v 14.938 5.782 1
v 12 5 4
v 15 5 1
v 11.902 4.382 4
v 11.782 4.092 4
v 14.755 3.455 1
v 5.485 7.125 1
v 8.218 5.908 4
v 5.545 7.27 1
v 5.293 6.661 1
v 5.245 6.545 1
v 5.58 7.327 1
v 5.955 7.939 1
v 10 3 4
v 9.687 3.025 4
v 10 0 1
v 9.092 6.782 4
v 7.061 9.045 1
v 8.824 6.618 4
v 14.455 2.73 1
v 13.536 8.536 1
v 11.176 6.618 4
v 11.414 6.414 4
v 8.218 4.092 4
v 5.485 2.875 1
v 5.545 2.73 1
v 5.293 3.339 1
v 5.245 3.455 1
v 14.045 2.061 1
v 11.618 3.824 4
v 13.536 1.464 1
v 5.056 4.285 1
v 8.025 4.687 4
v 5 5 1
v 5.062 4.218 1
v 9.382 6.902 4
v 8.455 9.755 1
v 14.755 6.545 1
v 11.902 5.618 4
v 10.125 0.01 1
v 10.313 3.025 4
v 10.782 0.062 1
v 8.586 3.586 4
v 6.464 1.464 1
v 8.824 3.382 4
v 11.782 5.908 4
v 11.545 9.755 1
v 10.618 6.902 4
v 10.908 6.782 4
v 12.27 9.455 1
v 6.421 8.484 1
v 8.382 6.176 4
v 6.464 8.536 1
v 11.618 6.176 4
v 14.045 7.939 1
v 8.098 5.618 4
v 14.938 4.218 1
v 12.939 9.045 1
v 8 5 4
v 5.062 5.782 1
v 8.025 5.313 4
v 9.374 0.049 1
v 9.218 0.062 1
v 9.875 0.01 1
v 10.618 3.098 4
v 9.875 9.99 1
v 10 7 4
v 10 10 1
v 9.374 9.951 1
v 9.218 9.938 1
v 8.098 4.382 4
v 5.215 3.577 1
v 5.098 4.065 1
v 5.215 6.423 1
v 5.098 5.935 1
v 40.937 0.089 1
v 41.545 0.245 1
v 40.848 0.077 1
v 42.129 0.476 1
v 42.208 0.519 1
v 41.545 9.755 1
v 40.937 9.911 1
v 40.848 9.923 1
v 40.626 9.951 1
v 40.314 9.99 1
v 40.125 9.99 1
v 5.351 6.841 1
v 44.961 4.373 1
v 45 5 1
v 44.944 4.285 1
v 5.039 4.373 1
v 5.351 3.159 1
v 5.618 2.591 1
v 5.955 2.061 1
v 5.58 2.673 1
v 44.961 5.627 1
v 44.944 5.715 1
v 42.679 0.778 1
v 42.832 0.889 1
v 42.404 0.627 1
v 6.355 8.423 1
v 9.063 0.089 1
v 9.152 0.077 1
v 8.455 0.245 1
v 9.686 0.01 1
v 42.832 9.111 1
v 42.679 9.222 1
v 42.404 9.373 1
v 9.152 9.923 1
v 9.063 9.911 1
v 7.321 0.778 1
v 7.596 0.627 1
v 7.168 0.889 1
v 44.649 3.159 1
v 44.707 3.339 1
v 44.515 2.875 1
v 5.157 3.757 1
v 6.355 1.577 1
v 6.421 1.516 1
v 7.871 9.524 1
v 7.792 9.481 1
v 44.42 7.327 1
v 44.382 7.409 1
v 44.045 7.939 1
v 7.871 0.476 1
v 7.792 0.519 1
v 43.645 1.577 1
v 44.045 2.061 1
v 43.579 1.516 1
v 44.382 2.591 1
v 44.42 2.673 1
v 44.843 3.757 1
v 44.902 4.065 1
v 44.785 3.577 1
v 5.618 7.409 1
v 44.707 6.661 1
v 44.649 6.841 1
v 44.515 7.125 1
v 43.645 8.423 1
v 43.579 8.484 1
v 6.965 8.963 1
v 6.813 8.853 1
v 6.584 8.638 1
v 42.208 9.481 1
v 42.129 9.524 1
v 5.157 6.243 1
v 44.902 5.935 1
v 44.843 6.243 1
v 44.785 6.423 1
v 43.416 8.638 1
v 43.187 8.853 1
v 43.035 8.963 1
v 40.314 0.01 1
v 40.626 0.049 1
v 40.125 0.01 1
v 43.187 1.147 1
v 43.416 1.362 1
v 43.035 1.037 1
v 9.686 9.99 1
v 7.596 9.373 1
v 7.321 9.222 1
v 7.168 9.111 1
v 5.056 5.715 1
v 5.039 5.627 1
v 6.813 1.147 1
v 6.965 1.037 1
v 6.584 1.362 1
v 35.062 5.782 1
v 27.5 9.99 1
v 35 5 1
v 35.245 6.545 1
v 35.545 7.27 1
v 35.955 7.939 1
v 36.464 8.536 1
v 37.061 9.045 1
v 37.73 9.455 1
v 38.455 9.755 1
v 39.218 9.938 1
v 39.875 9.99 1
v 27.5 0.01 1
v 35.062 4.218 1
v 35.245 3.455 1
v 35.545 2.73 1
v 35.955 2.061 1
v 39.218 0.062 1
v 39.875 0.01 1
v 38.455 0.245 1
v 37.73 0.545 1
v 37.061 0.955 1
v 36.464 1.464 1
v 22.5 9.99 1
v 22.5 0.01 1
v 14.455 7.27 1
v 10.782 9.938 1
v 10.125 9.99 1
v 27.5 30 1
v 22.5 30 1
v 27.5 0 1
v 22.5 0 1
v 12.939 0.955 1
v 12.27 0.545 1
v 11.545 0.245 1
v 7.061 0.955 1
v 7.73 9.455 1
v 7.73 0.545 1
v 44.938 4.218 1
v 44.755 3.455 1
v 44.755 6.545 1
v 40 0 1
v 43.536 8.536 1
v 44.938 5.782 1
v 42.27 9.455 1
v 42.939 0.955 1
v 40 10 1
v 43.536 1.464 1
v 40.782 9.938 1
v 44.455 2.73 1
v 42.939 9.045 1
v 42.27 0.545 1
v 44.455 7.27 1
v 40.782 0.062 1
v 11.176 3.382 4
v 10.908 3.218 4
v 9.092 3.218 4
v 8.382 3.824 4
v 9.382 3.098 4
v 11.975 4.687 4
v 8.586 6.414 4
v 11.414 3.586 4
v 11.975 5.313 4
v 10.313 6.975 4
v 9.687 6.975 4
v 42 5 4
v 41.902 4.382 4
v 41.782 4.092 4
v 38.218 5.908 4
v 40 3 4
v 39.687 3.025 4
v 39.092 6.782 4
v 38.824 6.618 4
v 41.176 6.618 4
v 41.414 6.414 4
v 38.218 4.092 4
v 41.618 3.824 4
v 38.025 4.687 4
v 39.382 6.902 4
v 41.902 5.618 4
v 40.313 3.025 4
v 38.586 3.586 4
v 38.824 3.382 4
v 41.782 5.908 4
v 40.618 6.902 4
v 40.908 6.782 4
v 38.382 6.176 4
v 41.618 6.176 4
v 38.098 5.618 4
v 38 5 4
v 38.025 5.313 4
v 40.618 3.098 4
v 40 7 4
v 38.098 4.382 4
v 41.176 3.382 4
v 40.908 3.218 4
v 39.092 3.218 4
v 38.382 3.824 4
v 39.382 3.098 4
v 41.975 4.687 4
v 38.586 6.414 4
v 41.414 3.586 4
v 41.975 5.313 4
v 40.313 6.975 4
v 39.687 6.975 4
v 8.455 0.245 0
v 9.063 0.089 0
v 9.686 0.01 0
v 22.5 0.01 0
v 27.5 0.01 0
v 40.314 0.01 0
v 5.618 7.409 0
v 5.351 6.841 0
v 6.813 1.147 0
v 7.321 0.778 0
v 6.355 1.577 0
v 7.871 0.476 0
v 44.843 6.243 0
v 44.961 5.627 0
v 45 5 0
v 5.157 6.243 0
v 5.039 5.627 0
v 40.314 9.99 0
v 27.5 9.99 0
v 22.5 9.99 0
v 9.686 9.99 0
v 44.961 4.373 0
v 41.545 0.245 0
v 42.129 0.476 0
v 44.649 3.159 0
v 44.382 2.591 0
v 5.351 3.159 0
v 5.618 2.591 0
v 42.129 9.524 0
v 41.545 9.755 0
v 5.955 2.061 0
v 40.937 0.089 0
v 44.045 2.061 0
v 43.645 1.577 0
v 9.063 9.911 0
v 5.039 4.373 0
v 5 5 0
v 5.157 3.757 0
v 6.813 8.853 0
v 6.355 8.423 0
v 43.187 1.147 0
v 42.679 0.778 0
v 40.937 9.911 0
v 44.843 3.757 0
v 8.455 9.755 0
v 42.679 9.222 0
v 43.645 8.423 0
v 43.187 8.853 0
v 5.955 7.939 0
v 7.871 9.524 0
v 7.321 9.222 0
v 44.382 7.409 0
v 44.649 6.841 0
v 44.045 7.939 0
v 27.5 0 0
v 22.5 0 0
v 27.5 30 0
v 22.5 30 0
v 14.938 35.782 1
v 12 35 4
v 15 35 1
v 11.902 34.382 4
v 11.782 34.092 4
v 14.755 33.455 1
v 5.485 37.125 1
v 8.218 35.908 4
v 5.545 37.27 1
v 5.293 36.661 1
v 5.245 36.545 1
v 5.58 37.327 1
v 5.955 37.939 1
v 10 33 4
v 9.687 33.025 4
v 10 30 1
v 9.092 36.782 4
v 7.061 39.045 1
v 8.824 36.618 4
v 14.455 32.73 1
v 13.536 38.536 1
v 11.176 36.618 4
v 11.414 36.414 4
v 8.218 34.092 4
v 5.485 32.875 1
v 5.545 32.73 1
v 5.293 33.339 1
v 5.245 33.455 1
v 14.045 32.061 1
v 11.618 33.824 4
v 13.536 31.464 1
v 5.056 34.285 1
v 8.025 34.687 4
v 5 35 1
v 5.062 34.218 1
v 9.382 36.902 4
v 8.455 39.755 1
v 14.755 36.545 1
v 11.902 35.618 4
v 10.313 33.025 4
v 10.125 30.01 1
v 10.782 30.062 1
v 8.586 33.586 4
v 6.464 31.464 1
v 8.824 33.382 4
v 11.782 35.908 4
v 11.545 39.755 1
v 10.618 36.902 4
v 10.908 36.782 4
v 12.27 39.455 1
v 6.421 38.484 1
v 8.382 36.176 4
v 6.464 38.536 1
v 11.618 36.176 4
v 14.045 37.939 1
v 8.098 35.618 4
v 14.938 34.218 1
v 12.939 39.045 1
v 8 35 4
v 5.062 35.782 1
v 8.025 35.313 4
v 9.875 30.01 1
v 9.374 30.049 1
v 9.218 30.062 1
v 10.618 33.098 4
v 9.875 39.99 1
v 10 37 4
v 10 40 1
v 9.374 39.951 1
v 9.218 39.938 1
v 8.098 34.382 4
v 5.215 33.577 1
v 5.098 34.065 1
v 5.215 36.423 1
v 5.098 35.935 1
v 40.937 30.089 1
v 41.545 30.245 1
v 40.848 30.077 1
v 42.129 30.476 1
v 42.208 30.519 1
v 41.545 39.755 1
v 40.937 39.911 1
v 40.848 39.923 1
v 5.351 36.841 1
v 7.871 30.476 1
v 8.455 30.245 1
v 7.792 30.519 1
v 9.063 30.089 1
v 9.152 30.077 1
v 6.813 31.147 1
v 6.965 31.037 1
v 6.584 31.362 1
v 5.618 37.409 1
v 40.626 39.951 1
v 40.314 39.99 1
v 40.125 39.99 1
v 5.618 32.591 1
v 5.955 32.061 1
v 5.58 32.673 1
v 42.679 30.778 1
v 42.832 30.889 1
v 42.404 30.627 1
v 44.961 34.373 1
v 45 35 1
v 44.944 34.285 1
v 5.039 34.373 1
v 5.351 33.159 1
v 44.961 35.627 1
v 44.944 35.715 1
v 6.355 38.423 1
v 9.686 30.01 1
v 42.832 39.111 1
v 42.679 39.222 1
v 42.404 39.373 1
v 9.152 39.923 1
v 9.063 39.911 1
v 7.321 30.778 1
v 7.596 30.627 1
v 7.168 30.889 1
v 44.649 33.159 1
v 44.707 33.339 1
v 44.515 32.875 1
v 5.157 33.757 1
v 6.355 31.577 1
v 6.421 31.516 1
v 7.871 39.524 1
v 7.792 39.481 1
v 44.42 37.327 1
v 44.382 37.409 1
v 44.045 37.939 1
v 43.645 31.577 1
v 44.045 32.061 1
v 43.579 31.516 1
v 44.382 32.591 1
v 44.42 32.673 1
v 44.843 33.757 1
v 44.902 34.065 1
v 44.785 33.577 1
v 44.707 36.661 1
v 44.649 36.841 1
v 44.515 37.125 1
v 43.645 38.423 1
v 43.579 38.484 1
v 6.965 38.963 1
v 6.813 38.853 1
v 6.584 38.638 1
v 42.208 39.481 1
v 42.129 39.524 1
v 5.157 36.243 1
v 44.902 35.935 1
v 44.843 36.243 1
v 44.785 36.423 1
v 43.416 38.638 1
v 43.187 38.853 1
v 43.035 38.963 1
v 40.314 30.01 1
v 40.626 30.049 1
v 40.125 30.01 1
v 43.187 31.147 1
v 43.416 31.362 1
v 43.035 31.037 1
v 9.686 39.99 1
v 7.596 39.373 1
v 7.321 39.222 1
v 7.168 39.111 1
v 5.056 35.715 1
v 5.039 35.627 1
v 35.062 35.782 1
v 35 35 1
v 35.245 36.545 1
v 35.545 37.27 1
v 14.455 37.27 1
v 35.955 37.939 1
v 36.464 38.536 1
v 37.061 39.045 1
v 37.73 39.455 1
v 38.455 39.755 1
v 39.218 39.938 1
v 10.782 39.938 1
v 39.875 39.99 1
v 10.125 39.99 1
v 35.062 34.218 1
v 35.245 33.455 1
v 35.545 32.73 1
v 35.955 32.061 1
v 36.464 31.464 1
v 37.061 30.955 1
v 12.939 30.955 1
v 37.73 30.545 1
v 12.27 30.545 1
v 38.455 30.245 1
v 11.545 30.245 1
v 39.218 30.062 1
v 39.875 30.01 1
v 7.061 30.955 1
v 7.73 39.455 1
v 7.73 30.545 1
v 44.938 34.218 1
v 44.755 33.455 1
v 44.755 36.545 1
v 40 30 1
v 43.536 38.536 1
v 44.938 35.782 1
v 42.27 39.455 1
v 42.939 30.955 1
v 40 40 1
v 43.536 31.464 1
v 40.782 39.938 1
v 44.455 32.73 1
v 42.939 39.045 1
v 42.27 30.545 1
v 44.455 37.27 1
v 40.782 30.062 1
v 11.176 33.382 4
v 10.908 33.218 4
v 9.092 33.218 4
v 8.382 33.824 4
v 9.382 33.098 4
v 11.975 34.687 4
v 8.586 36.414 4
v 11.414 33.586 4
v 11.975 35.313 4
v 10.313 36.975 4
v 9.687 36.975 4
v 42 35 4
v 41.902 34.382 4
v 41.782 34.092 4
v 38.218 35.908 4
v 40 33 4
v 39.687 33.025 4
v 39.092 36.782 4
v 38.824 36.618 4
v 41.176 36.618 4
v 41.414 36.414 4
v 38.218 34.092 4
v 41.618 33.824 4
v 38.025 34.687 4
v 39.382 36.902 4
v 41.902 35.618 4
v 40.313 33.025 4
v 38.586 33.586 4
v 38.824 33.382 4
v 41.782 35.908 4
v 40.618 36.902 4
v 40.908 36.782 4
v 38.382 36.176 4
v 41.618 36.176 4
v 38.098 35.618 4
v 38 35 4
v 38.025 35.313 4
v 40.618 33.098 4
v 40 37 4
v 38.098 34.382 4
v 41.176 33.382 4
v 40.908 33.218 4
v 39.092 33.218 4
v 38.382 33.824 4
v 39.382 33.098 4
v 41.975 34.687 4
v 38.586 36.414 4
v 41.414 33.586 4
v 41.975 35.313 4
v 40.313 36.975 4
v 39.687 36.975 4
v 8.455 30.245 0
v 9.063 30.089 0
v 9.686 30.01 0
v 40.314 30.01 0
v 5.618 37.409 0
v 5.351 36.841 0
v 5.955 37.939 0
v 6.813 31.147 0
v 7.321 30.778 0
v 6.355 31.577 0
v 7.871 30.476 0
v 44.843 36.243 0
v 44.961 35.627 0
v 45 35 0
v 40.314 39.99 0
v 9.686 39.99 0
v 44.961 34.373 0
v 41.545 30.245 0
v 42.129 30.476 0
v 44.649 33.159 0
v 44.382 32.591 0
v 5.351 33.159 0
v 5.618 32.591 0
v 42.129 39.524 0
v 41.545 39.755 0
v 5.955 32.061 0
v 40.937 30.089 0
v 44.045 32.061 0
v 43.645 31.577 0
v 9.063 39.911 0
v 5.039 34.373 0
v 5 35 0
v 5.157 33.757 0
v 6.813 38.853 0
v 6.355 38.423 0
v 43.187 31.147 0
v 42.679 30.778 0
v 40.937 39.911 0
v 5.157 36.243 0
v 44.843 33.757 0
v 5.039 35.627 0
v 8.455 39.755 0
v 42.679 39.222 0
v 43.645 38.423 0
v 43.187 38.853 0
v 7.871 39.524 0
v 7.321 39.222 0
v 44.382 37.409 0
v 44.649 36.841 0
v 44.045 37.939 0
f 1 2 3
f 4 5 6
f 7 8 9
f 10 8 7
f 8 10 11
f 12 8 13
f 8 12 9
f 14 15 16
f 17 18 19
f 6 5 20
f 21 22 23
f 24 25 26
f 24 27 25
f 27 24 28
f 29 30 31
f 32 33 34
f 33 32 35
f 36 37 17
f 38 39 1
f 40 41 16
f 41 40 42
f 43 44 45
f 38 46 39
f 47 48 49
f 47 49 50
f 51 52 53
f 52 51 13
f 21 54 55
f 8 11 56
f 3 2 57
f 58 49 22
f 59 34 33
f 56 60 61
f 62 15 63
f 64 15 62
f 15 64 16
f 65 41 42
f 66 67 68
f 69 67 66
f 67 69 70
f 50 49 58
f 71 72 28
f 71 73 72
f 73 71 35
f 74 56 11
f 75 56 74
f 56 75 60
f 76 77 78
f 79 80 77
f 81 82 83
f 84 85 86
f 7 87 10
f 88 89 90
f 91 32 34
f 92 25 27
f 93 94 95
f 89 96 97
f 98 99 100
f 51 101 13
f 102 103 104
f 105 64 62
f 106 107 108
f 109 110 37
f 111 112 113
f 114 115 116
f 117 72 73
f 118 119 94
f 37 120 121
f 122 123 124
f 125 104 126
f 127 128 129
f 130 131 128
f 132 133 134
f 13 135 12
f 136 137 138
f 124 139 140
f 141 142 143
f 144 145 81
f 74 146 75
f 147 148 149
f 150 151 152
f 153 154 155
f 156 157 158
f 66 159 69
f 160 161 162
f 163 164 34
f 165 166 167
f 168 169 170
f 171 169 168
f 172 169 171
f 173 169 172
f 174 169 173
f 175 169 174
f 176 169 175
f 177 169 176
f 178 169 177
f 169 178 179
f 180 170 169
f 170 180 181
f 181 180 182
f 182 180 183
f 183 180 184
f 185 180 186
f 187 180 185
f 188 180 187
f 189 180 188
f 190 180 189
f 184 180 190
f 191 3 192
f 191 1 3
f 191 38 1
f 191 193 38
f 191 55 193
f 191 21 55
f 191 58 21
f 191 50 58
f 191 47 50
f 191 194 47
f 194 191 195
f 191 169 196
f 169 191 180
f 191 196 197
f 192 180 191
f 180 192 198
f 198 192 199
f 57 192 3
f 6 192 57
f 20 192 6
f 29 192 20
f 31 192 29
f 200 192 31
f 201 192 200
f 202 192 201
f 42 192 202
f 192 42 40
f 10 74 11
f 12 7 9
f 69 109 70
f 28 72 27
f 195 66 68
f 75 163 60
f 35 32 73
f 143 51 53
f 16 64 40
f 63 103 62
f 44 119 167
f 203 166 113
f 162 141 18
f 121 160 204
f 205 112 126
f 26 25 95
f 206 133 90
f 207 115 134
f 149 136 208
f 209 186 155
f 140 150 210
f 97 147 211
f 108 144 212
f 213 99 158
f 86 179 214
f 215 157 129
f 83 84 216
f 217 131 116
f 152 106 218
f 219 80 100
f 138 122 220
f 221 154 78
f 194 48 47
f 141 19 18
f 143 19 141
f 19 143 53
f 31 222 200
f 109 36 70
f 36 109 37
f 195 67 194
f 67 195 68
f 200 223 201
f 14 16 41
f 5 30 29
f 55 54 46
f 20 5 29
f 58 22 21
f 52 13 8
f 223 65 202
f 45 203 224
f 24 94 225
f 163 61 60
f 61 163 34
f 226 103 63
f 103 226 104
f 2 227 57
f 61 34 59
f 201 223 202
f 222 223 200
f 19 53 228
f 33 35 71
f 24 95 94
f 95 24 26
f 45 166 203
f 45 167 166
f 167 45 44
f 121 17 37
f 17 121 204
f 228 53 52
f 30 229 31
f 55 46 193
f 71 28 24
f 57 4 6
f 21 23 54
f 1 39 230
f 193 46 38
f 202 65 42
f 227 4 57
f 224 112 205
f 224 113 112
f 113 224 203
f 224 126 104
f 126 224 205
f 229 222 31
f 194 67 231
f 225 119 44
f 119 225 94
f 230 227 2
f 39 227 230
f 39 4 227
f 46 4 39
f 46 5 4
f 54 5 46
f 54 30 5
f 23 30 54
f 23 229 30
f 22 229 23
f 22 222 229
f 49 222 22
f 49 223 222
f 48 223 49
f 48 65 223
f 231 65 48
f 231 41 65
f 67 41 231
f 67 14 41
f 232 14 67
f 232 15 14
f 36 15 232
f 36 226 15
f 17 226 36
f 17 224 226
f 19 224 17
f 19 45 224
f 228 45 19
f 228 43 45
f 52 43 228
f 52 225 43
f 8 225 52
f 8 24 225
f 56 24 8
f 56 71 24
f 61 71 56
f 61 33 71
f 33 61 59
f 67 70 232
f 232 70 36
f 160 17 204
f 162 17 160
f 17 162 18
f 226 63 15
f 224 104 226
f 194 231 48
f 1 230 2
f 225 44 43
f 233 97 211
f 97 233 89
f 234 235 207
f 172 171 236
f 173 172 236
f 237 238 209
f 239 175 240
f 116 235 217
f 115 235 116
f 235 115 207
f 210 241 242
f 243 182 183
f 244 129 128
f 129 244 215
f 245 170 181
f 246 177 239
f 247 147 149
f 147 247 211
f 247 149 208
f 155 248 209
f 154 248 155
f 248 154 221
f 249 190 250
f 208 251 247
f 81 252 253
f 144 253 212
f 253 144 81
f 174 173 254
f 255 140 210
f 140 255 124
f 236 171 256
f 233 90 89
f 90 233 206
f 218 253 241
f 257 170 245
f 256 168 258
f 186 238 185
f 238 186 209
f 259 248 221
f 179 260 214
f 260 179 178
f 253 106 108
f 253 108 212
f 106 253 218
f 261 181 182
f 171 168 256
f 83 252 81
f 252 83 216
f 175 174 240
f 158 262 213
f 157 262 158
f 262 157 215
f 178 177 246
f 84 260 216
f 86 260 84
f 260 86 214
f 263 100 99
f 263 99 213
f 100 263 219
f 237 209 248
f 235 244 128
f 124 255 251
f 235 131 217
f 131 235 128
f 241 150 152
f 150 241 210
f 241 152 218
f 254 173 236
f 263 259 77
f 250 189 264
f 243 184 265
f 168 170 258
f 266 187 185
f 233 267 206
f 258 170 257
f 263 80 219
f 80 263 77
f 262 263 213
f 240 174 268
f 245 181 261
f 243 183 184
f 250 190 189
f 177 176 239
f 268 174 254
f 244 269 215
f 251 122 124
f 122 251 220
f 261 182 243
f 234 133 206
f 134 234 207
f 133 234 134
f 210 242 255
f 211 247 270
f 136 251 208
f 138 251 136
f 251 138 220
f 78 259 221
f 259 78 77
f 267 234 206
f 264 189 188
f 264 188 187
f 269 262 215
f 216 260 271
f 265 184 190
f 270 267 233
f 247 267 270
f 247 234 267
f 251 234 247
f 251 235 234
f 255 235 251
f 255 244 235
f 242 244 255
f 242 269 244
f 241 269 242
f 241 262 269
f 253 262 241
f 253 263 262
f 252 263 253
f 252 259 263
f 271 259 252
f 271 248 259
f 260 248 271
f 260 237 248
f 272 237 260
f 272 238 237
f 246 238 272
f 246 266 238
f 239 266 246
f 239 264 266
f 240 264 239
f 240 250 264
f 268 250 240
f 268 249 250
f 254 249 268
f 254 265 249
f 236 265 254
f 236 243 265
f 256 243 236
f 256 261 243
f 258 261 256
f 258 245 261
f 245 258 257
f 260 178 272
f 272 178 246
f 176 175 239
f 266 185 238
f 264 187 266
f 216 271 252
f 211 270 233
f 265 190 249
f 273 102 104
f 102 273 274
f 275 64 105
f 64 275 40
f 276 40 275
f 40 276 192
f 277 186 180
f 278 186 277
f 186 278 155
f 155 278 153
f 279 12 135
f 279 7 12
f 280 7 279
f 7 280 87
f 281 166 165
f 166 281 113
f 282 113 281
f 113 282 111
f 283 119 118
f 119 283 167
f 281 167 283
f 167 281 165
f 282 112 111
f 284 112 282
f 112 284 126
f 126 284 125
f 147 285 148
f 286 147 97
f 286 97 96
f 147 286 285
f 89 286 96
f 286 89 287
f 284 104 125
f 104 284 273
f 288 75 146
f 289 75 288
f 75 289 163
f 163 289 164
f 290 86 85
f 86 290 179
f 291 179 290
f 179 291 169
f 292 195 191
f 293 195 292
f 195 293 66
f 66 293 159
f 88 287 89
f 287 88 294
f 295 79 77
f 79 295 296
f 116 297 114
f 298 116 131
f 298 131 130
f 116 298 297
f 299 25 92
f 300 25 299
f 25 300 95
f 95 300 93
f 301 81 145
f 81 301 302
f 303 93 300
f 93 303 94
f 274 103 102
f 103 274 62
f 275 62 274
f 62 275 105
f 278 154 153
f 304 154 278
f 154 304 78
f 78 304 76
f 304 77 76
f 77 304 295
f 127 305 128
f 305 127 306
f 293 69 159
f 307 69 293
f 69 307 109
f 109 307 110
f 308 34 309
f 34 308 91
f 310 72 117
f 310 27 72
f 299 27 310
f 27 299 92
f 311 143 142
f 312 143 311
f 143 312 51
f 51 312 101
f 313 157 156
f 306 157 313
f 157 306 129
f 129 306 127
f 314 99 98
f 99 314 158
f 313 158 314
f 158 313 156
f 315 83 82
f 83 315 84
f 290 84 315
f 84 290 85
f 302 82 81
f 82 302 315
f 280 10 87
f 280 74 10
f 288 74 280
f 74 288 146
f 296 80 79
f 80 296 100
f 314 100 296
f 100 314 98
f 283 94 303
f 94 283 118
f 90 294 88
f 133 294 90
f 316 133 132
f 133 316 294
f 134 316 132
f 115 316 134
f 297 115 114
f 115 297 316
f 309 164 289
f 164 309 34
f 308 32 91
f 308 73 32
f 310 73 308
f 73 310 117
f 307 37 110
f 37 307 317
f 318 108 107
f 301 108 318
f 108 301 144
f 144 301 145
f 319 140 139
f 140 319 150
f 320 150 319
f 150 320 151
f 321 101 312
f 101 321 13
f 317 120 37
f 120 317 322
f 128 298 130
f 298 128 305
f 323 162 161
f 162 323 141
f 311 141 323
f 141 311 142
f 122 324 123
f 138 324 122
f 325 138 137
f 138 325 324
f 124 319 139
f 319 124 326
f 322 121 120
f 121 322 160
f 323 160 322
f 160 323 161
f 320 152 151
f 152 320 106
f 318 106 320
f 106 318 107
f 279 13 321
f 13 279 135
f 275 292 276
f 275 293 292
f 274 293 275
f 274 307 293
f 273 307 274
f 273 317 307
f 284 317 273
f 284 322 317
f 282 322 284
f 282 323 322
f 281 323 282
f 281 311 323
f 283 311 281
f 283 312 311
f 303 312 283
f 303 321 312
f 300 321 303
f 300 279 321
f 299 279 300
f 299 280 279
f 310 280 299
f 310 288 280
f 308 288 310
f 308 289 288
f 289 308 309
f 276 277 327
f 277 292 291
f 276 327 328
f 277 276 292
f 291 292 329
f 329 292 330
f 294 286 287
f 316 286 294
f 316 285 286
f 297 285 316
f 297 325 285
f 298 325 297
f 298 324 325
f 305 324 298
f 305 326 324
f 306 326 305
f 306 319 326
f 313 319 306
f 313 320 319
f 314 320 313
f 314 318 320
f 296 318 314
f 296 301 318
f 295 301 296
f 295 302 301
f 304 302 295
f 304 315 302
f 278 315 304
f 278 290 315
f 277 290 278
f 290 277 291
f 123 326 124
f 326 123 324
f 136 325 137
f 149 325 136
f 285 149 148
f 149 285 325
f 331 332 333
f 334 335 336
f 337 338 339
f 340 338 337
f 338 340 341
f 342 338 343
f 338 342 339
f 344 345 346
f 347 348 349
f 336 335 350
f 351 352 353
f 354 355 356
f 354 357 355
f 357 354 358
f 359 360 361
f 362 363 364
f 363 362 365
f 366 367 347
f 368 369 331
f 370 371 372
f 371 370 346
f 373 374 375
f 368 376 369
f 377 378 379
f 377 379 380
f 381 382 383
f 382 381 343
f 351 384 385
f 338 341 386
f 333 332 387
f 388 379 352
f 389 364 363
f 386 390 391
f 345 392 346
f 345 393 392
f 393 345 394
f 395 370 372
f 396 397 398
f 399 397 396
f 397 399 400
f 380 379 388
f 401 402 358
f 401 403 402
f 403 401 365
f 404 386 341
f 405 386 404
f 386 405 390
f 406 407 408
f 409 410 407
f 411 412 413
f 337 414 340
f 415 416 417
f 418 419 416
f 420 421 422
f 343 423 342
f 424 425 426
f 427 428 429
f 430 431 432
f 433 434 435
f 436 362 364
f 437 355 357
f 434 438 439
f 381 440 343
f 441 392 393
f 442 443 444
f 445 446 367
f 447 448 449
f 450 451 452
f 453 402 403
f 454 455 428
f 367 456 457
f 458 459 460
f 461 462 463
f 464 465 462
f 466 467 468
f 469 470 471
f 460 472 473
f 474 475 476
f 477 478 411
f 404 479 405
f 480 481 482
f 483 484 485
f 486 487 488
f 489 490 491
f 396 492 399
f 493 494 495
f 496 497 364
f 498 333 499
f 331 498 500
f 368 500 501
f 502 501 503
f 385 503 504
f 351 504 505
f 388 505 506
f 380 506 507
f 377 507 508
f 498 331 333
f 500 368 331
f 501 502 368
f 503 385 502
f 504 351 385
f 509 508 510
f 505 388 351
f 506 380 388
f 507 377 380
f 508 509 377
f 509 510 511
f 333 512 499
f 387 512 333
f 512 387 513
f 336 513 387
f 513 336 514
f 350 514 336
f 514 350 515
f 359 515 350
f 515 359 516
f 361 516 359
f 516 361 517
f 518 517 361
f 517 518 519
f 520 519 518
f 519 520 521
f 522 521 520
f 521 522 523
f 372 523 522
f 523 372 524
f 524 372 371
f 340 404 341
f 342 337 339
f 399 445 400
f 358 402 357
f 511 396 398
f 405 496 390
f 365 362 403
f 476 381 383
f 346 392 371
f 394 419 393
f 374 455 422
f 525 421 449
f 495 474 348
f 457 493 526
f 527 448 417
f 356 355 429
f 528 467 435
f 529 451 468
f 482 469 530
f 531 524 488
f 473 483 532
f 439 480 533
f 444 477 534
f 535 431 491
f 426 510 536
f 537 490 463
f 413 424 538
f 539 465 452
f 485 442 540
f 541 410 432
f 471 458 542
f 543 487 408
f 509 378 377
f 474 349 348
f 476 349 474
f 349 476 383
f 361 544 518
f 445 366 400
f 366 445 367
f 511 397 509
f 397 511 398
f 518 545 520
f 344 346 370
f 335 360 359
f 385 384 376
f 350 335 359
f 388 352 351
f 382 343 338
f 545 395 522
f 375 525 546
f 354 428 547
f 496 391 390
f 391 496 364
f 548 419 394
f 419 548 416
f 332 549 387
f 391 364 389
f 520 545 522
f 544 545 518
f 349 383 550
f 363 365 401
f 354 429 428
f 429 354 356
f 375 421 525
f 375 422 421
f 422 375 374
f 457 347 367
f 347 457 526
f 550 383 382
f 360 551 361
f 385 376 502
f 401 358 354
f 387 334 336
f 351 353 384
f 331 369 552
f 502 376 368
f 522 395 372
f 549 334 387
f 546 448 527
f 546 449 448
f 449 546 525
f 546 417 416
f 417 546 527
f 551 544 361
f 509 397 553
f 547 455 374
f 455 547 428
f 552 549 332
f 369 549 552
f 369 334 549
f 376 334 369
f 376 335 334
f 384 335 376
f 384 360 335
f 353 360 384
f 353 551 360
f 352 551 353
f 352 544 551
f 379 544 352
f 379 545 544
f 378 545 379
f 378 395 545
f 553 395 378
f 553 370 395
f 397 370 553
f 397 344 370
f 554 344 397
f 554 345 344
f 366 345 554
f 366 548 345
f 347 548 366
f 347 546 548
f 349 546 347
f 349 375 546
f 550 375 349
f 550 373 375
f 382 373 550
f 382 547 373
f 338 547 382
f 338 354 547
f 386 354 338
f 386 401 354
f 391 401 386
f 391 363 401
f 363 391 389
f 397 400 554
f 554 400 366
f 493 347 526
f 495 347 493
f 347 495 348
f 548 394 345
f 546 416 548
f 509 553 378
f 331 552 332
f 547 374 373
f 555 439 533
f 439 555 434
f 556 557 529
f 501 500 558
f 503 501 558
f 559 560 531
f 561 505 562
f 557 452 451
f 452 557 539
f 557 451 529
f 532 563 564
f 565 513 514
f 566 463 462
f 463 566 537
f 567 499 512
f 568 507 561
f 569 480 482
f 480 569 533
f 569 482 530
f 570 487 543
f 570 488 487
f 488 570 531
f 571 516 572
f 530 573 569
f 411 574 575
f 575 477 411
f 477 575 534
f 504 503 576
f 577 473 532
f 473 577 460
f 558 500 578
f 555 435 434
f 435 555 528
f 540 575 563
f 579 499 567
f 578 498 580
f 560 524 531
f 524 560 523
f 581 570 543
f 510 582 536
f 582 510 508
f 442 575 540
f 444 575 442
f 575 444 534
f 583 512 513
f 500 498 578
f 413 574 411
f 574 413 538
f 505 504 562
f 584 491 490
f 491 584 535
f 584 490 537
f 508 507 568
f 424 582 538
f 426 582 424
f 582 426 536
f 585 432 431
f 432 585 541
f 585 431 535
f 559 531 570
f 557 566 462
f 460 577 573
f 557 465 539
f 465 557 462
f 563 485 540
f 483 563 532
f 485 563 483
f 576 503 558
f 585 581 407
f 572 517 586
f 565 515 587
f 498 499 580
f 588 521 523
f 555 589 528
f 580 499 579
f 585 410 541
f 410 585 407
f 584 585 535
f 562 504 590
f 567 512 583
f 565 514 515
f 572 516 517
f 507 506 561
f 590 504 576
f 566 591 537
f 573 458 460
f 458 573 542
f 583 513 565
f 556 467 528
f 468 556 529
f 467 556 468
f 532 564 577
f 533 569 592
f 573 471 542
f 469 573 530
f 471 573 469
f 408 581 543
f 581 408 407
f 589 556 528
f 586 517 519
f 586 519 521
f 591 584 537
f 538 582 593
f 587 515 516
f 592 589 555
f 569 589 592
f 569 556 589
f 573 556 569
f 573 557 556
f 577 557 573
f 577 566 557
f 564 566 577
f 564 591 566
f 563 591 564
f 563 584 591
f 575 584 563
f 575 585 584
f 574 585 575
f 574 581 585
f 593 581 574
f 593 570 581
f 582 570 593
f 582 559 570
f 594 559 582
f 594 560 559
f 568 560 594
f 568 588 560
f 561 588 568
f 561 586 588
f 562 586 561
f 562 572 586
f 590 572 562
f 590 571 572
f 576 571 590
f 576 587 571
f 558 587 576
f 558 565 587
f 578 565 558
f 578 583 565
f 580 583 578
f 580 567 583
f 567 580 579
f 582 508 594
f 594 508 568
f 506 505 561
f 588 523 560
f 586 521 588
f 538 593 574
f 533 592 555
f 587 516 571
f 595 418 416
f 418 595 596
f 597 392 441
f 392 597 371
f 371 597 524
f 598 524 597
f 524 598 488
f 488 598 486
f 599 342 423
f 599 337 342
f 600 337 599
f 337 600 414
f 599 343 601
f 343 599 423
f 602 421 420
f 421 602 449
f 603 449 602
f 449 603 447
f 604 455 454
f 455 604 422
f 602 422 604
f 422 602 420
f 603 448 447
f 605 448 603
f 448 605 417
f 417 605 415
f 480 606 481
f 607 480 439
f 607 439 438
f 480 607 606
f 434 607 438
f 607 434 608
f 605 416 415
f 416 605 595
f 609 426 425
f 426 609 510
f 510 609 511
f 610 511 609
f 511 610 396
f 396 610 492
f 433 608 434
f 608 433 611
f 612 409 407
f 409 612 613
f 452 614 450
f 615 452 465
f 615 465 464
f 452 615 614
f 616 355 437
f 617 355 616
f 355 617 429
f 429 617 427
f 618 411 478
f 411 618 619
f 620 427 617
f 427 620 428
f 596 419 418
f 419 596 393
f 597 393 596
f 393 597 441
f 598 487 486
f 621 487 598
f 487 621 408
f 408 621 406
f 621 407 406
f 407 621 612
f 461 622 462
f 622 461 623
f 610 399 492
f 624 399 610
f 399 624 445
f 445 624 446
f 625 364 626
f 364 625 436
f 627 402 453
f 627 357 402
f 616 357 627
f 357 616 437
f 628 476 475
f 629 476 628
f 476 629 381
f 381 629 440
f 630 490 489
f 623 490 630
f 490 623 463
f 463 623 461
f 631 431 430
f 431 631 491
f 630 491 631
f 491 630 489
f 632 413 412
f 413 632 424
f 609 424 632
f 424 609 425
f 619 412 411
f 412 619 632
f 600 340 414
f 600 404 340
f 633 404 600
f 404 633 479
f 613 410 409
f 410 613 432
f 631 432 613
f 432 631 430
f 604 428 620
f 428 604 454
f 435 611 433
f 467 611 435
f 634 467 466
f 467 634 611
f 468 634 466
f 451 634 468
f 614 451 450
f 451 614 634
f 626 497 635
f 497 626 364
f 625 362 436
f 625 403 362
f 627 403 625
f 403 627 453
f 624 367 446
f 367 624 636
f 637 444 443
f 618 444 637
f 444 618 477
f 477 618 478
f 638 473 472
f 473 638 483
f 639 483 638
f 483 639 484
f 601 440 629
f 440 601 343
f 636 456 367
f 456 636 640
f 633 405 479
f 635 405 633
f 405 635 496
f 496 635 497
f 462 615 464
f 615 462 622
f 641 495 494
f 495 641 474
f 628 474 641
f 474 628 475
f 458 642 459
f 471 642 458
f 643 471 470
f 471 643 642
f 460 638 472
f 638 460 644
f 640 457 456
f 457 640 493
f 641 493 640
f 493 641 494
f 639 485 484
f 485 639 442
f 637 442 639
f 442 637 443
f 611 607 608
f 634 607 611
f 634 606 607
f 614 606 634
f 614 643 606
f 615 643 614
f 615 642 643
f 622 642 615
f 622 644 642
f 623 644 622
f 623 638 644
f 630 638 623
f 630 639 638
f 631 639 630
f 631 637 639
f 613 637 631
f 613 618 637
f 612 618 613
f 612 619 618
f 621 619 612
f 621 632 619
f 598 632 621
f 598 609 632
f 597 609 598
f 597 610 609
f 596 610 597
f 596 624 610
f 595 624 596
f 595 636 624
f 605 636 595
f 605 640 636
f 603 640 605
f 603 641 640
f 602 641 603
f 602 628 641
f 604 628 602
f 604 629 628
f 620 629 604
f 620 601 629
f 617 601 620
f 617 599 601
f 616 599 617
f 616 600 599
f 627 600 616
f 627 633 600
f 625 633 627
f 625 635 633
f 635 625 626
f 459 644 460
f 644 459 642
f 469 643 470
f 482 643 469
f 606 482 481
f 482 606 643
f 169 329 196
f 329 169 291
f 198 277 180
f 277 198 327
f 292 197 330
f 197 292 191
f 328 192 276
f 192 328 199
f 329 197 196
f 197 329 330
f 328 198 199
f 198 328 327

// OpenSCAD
translate([22.5,0]) cube([5,30,1]);
for(y=[0,30])
  translate([0,y]) {
    hull()
      for(x=[10,40]) translate([x,5]) cylinder(d=10,h=1,$fn=50);
    for(x=[10,40])
      translate([x,5,1]) cylinder(d1=10,d2=4,h=3,$fn=40);
  }
